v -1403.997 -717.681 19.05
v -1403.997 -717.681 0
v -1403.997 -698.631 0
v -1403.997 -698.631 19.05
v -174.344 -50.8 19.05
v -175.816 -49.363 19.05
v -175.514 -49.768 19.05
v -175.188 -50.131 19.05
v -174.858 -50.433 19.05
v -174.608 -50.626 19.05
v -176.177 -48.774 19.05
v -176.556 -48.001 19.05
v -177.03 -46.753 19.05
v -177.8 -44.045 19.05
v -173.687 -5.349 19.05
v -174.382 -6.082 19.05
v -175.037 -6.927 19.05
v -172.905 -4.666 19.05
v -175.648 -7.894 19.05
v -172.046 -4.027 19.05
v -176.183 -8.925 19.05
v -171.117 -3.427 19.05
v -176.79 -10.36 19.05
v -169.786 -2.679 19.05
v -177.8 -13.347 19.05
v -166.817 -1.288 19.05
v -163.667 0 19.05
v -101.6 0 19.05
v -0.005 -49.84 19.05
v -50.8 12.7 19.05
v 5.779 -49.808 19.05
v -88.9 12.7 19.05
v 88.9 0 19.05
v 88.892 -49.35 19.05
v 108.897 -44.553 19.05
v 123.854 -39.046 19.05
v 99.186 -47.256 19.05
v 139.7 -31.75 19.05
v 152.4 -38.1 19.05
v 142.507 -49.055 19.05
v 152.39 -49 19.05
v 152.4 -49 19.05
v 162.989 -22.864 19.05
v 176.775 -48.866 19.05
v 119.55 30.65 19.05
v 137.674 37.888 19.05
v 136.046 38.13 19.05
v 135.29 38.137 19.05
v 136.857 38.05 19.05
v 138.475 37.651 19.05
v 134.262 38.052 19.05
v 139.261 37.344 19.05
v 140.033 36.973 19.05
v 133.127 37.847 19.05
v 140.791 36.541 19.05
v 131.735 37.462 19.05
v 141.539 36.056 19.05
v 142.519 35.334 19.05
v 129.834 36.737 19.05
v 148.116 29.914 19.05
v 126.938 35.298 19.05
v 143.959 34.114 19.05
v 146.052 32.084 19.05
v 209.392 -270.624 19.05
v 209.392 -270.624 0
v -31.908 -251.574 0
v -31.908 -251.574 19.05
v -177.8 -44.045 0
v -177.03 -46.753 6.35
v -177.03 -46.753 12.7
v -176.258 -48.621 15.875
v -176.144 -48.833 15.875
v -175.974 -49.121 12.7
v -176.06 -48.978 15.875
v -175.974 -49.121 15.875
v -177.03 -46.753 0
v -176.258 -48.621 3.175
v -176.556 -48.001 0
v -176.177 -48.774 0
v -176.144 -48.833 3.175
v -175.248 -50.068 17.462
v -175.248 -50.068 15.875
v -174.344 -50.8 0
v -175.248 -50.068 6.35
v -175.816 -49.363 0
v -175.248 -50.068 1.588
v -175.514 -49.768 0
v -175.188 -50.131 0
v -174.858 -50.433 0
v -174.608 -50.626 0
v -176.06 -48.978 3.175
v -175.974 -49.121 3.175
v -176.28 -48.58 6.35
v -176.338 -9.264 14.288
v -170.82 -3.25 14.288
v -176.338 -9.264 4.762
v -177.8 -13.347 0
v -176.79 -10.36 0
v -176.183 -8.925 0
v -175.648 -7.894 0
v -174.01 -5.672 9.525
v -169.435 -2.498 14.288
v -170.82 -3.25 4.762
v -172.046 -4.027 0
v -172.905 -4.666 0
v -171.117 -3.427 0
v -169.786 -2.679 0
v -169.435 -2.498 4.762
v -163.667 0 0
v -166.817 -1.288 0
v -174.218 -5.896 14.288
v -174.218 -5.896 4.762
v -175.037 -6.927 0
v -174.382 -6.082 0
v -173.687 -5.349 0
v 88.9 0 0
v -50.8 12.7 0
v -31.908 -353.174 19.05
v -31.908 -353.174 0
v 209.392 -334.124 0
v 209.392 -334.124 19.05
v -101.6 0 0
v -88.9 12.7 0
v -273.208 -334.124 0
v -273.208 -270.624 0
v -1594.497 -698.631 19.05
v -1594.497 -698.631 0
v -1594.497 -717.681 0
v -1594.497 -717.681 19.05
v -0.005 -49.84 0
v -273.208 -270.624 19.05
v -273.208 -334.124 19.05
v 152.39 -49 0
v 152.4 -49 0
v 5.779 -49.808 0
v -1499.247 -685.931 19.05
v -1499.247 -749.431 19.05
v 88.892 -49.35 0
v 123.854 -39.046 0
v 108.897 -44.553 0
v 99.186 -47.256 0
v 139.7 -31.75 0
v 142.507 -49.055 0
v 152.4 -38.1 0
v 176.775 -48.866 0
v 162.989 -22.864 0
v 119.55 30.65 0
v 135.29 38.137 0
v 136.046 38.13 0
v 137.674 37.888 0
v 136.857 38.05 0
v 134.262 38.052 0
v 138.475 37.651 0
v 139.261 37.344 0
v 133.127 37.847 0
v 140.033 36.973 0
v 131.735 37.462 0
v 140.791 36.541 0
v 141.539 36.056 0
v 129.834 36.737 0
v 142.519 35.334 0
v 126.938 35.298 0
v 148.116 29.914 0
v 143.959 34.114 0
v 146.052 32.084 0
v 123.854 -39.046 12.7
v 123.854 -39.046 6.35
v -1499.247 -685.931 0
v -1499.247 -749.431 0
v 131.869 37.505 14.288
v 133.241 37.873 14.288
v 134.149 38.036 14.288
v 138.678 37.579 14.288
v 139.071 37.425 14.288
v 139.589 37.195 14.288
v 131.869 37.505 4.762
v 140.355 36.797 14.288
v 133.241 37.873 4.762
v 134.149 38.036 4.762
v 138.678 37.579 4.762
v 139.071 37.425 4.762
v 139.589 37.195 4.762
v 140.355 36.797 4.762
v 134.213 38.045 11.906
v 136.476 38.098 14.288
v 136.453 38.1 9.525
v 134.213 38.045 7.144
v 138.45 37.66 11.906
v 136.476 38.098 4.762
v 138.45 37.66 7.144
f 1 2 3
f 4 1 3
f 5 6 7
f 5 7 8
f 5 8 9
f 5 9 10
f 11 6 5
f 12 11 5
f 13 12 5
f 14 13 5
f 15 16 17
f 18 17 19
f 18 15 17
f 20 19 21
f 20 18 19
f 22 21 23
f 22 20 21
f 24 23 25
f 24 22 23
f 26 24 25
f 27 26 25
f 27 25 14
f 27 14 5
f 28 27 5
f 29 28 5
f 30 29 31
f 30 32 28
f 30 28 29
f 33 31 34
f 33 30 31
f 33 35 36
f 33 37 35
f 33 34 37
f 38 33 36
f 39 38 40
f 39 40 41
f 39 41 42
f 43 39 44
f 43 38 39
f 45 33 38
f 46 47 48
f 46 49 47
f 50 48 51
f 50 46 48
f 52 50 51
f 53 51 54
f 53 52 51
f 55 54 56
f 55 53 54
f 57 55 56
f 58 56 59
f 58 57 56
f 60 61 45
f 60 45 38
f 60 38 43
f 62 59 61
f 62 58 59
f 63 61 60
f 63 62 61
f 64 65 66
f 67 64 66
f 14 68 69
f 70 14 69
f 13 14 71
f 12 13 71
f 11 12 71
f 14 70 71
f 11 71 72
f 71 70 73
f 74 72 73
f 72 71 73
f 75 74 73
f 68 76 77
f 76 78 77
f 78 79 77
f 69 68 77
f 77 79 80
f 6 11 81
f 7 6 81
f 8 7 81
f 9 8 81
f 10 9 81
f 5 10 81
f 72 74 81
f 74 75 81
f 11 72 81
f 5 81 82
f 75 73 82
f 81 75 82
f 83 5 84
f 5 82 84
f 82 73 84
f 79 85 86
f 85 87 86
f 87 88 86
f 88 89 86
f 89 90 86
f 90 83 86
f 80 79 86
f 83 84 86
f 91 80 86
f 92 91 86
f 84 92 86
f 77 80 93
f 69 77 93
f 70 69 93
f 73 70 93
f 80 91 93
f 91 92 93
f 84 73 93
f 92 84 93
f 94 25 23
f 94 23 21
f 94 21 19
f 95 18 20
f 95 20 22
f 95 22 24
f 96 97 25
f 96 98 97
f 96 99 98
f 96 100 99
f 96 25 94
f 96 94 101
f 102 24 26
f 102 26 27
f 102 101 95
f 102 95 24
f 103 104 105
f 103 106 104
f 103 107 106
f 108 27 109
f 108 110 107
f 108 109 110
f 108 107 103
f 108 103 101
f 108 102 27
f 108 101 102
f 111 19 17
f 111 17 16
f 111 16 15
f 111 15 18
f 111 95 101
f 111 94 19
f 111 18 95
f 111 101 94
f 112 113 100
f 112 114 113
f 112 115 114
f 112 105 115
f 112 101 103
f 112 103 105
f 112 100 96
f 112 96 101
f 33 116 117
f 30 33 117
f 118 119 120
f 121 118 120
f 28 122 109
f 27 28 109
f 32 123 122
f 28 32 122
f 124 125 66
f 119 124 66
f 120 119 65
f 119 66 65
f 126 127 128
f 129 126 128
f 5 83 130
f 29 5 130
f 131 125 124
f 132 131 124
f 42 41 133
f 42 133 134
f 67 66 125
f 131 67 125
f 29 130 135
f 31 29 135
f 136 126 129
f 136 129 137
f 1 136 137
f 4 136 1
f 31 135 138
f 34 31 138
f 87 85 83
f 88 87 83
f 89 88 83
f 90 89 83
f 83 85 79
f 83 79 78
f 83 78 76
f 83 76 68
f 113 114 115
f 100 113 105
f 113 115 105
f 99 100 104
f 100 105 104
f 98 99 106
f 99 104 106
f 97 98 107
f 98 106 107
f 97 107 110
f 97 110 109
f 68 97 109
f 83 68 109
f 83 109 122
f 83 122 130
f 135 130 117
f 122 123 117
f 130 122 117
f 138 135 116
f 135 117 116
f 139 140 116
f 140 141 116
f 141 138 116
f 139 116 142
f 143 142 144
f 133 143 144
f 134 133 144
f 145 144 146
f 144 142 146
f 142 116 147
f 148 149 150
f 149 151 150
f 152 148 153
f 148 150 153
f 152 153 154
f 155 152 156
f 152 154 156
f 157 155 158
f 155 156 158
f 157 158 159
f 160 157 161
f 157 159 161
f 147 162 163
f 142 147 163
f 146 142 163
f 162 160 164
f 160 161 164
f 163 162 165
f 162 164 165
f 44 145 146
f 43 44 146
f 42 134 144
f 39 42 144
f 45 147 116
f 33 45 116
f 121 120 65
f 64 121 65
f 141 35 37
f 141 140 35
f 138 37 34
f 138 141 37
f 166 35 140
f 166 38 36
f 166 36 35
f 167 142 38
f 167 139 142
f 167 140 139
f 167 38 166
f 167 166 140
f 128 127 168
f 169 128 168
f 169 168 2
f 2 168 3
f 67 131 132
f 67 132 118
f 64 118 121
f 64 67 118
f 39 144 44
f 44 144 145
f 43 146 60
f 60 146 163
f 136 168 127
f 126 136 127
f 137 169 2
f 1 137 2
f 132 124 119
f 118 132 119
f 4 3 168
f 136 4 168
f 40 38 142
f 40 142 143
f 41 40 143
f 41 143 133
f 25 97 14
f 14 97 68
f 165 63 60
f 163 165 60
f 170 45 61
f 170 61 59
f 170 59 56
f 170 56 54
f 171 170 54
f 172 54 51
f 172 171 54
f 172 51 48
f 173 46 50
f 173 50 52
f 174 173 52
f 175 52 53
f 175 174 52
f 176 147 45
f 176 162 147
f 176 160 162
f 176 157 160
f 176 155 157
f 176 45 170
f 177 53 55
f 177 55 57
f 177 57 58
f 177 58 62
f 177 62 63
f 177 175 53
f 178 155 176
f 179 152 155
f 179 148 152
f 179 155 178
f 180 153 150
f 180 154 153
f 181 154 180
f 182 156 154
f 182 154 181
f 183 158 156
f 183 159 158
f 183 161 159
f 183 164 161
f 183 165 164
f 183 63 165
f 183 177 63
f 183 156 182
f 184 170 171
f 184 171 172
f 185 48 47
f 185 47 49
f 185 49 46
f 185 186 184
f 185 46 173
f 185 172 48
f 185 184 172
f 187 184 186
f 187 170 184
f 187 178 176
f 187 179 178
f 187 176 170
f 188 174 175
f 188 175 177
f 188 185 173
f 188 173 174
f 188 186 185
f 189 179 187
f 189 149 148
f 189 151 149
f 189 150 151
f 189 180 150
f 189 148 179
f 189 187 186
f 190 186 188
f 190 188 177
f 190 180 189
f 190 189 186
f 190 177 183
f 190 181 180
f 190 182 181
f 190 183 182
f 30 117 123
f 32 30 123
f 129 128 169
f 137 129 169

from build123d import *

# Parameters (mm, degrees)
F3_DEPTH = 19.05
F4_DEPTH = 19.05
F5_DEPTH = 19.05


with BuildPart() as f3:
    # F0 (on Top) → F3 (new body)
    with BuildSketch(Plane.XY):
        with BuildLine():
            add(Edge.make_bspline(
                [(-177.8, -44.0448261797), (-177.0777895805, -46.8072402804), (-176.3555364748, -49.58105635), (-174.3441075087, -50.8)],
                knots=[0, 0, 0, 0, 0.4535902473, 0.4535902473, 0.4535902473, 0.4535902473], degree=3))
            Line((-174.3441075087, -50.8), (-163.3332285527, -50.7393466807))
            Line((-163.3332285527, -50.7393466807), (-101.6022072413, -50.3993019521))
            Line((-101.6022072413, -50.3993019521), (-88.9025925916, -50.3293462487))
            Line((-88.9025925916, -50.3293462487), (-50.8037486425, -50.1194791385))
            Line((-50.8037486425, -50.1194791385), (-0.0052900438, -49.8396563249))
            Line((-0.0052900438, -49.8396563249), (5.7788467086, -49.807794464))
            Line((5.7788467086, -49.807794464), (88.8920125041, -49.3499664011))
            add(Edge.make_bspline(
                [(139.7, -31.75), (124.0234794468, -39.4996184949), (108.2155005248, -46.1477855032), (88.8920125041, -49.3499664011)],
                knots=[0, 0, 0, 0, 0.4457762067, 0.4457762067, 0.4457762067, 0.4457762067], degree=3))
            Line((139.7, -31.75), (142.5074338913, -49.0546263754))
            Line((142.5074338913, -49.0546263754), (152.3900857525, -49.0001878841))
            Line((152.3900857525, -49.0001878841), (152.4, -49.0001332715))
            Line((152.4, -49.0001332715), (152.4, -38.1))
            Line((152.4, -38.1), (176.774539657, -48.8658663576))
            Line((176.774539657, -48.8658663576), (162.9887670279, -22.8643473238))
            Line((162.9887670279, -22.8643473238), (148.1155100606, 29.9144967843))
            add(Edge.make_bspline(
                [(119.5501881436, 30.6501881436), (125.5058537914, 34.6214833979), (136.6923147426, 42.0807233747), (144.4759008901, 33.7908473707), (148.1155100606, 29.9144967843)],
                knots=[0, 0, 0, 0, 0.5323994491, 1, 1, 1, 1], degree=3))
            Line((119.5501881436, 30.6501881436), (88.9, 0))
            Line((88.9, 0), (-50.8, 12.7))
            Line((-50.8, 12.7), (-88.9, 12.7))
            Line((-88.9, 12.7), (-101.6, 0))
            Line((-101.6, 0), (-163.6665612459, 0))
            add(Edge.make_bspline(
                [(-177.8, -13.3469169959), (-176.921741721, -10.5708188304), (-175.0123951815, -4.535540197), (-167.6450735995, -1.5904254201), (-163.6665612459, 0)],
                knots=[0, 0, 0, 0, 0.459978459, 1, 1, 1, 1], degree=3))
            Line((-177.8, -13.3469169959), (-177.8, -44.0448261797))
        make_face()
    extrude(amount=F3_DEPTH)


with BuildPart() as f4:
    # F1 (on Top) → F4 (new body)
    with BuildSketch(Plane.XY):
        Polygon((-31.9079441309, -251.5737625599), (-273.2079441309, -270.6237625599), (-273.2079441309, -334.1237625599), (-31.9079441309, -353.1737625599), (209.3920558691, -334.1237625599), (209.3920558691, -270.6237625599), align=None)
    extrude(amount=F4_DEPTH)


with BuildPart() as f5:
    # F2 (on Top) → F5 (new body)
    with BuildSketch(Plane.XY):
        Polygon((-1499.2469444275, -685.9311928749), (-1594.4969444275, -698.6311928749), (-1594.4969444275, -717.6811928749), (-1499.2469444275, -749.4311928749), (-1403.9969444275, -717.6811928749), (-1403.9969444275, -698.6311928749), align=None)
    extrude(amount=F5_DEPTH)


solid = Compound([f3.part, f4.part, f5.part])
